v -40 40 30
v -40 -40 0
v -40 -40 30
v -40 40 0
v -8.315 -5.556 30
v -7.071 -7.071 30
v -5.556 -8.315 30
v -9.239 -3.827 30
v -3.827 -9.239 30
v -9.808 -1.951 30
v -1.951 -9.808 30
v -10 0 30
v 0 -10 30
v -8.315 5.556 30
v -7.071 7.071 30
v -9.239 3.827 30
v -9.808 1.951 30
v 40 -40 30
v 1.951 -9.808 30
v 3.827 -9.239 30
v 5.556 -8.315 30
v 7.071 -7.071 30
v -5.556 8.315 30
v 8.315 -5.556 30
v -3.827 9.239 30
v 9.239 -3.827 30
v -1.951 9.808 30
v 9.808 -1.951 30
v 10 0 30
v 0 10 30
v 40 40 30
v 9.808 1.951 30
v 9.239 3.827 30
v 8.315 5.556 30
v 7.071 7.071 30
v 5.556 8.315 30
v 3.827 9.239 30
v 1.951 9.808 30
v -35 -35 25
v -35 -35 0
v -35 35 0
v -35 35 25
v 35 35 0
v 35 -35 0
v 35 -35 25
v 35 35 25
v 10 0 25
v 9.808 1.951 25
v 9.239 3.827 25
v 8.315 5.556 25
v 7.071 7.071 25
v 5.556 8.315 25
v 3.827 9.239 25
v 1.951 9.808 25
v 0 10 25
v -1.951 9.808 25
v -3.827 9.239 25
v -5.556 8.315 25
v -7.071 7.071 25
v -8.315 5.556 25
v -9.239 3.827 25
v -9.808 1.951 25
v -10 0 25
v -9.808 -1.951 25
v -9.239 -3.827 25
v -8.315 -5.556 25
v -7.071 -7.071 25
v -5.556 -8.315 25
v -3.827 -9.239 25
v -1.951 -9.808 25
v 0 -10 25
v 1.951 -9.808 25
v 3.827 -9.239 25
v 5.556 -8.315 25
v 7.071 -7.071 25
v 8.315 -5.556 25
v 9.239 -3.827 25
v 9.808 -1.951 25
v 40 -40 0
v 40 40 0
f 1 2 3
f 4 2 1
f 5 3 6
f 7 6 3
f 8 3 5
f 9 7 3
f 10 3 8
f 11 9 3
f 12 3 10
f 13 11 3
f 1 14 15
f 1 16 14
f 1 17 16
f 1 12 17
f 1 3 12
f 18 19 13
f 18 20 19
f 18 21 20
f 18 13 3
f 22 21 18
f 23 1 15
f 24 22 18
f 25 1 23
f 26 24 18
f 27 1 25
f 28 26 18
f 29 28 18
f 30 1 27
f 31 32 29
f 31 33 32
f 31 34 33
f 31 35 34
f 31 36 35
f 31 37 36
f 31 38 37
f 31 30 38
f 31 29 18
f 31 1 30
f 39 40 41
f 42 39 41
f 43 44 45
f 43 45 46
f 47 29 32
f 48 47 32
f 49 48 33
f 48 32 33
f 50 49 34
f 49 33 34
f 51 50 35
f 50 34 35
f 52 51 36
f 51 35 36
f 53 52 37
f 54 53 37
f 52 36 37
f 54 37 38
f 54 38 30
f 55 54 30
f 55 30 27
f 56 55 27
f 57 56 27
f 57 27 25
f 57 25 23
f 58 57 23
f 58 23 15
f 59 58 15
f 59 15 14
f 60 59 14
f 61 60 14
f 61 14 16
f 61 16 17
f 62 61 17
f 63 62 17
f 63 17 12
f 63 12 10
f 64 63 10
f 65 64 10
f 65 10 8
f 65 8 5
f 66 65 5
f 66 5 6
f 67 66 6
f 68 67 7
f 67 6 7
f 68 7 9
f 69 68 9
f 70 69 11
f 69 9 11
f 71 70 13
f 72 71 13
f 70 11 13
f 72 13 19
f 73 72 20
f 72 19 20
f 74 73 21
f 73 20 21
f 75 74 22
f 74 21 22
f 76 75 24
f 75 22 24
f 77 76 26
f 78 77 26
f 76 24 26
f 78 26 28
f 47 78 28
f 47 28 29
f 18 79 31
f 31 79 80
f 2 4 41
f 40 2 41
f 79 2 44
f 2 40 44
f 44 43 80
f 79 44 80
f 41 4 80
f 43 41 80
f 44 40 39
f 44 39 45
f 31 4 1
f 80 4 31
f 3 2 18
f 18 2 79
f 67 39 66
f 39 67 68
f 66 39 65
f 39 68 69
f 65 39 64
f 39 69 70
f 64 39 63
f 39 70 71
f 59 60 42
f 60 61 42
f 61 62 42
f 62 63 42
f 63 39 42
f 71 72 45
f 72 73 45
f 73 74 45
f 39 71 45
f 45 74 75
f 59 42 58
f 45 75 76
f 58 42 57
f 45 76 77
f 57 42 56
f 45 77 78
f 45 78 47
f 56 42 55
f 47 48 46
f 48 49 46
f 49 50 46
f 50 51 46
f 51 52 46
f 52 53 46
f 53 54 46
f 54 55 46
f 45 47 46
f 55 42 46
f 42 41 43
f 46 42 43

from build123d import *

# Parameters (mm, degrees)
SKETCH1_W           = 80
SKETCH1_H           = 80
BOSS_EXTRUDE1_DEPTH = 30
SHELL1_T            = -5
SKETCH3_R           = 10
CUT_EXTRUDE1_DEPTH  = 10


with BuildPart() as part:
    # Sketch1 → Boss-Extrude1 (new body)
    with BuildSketch(Plane.XY):
        Rectangle(SKETCH1_W, SKETCH1_H)
    extrude(amount=BOSS_EXTRUDE1_DEPTH)

    # Shell1
    shell1_openings = [part.faces().sort_by_distance(p)[0] for p in [
        (0, 0, 0),
    ]]
    offset(amount=SHELL1_T, openings=shell1_openings, kind=Kind.INTERSECTION)

    # Sketch3 → Cut-Extrude1 (cut)
    with BuildSketch(Plane.XY.offset(30)):
        Circle(SKETCH3_R)
    extrude(amount=-CUT_EXTRUDE1_DEPTH, mode=Mode.SUBTRACT)


solid = part.part
